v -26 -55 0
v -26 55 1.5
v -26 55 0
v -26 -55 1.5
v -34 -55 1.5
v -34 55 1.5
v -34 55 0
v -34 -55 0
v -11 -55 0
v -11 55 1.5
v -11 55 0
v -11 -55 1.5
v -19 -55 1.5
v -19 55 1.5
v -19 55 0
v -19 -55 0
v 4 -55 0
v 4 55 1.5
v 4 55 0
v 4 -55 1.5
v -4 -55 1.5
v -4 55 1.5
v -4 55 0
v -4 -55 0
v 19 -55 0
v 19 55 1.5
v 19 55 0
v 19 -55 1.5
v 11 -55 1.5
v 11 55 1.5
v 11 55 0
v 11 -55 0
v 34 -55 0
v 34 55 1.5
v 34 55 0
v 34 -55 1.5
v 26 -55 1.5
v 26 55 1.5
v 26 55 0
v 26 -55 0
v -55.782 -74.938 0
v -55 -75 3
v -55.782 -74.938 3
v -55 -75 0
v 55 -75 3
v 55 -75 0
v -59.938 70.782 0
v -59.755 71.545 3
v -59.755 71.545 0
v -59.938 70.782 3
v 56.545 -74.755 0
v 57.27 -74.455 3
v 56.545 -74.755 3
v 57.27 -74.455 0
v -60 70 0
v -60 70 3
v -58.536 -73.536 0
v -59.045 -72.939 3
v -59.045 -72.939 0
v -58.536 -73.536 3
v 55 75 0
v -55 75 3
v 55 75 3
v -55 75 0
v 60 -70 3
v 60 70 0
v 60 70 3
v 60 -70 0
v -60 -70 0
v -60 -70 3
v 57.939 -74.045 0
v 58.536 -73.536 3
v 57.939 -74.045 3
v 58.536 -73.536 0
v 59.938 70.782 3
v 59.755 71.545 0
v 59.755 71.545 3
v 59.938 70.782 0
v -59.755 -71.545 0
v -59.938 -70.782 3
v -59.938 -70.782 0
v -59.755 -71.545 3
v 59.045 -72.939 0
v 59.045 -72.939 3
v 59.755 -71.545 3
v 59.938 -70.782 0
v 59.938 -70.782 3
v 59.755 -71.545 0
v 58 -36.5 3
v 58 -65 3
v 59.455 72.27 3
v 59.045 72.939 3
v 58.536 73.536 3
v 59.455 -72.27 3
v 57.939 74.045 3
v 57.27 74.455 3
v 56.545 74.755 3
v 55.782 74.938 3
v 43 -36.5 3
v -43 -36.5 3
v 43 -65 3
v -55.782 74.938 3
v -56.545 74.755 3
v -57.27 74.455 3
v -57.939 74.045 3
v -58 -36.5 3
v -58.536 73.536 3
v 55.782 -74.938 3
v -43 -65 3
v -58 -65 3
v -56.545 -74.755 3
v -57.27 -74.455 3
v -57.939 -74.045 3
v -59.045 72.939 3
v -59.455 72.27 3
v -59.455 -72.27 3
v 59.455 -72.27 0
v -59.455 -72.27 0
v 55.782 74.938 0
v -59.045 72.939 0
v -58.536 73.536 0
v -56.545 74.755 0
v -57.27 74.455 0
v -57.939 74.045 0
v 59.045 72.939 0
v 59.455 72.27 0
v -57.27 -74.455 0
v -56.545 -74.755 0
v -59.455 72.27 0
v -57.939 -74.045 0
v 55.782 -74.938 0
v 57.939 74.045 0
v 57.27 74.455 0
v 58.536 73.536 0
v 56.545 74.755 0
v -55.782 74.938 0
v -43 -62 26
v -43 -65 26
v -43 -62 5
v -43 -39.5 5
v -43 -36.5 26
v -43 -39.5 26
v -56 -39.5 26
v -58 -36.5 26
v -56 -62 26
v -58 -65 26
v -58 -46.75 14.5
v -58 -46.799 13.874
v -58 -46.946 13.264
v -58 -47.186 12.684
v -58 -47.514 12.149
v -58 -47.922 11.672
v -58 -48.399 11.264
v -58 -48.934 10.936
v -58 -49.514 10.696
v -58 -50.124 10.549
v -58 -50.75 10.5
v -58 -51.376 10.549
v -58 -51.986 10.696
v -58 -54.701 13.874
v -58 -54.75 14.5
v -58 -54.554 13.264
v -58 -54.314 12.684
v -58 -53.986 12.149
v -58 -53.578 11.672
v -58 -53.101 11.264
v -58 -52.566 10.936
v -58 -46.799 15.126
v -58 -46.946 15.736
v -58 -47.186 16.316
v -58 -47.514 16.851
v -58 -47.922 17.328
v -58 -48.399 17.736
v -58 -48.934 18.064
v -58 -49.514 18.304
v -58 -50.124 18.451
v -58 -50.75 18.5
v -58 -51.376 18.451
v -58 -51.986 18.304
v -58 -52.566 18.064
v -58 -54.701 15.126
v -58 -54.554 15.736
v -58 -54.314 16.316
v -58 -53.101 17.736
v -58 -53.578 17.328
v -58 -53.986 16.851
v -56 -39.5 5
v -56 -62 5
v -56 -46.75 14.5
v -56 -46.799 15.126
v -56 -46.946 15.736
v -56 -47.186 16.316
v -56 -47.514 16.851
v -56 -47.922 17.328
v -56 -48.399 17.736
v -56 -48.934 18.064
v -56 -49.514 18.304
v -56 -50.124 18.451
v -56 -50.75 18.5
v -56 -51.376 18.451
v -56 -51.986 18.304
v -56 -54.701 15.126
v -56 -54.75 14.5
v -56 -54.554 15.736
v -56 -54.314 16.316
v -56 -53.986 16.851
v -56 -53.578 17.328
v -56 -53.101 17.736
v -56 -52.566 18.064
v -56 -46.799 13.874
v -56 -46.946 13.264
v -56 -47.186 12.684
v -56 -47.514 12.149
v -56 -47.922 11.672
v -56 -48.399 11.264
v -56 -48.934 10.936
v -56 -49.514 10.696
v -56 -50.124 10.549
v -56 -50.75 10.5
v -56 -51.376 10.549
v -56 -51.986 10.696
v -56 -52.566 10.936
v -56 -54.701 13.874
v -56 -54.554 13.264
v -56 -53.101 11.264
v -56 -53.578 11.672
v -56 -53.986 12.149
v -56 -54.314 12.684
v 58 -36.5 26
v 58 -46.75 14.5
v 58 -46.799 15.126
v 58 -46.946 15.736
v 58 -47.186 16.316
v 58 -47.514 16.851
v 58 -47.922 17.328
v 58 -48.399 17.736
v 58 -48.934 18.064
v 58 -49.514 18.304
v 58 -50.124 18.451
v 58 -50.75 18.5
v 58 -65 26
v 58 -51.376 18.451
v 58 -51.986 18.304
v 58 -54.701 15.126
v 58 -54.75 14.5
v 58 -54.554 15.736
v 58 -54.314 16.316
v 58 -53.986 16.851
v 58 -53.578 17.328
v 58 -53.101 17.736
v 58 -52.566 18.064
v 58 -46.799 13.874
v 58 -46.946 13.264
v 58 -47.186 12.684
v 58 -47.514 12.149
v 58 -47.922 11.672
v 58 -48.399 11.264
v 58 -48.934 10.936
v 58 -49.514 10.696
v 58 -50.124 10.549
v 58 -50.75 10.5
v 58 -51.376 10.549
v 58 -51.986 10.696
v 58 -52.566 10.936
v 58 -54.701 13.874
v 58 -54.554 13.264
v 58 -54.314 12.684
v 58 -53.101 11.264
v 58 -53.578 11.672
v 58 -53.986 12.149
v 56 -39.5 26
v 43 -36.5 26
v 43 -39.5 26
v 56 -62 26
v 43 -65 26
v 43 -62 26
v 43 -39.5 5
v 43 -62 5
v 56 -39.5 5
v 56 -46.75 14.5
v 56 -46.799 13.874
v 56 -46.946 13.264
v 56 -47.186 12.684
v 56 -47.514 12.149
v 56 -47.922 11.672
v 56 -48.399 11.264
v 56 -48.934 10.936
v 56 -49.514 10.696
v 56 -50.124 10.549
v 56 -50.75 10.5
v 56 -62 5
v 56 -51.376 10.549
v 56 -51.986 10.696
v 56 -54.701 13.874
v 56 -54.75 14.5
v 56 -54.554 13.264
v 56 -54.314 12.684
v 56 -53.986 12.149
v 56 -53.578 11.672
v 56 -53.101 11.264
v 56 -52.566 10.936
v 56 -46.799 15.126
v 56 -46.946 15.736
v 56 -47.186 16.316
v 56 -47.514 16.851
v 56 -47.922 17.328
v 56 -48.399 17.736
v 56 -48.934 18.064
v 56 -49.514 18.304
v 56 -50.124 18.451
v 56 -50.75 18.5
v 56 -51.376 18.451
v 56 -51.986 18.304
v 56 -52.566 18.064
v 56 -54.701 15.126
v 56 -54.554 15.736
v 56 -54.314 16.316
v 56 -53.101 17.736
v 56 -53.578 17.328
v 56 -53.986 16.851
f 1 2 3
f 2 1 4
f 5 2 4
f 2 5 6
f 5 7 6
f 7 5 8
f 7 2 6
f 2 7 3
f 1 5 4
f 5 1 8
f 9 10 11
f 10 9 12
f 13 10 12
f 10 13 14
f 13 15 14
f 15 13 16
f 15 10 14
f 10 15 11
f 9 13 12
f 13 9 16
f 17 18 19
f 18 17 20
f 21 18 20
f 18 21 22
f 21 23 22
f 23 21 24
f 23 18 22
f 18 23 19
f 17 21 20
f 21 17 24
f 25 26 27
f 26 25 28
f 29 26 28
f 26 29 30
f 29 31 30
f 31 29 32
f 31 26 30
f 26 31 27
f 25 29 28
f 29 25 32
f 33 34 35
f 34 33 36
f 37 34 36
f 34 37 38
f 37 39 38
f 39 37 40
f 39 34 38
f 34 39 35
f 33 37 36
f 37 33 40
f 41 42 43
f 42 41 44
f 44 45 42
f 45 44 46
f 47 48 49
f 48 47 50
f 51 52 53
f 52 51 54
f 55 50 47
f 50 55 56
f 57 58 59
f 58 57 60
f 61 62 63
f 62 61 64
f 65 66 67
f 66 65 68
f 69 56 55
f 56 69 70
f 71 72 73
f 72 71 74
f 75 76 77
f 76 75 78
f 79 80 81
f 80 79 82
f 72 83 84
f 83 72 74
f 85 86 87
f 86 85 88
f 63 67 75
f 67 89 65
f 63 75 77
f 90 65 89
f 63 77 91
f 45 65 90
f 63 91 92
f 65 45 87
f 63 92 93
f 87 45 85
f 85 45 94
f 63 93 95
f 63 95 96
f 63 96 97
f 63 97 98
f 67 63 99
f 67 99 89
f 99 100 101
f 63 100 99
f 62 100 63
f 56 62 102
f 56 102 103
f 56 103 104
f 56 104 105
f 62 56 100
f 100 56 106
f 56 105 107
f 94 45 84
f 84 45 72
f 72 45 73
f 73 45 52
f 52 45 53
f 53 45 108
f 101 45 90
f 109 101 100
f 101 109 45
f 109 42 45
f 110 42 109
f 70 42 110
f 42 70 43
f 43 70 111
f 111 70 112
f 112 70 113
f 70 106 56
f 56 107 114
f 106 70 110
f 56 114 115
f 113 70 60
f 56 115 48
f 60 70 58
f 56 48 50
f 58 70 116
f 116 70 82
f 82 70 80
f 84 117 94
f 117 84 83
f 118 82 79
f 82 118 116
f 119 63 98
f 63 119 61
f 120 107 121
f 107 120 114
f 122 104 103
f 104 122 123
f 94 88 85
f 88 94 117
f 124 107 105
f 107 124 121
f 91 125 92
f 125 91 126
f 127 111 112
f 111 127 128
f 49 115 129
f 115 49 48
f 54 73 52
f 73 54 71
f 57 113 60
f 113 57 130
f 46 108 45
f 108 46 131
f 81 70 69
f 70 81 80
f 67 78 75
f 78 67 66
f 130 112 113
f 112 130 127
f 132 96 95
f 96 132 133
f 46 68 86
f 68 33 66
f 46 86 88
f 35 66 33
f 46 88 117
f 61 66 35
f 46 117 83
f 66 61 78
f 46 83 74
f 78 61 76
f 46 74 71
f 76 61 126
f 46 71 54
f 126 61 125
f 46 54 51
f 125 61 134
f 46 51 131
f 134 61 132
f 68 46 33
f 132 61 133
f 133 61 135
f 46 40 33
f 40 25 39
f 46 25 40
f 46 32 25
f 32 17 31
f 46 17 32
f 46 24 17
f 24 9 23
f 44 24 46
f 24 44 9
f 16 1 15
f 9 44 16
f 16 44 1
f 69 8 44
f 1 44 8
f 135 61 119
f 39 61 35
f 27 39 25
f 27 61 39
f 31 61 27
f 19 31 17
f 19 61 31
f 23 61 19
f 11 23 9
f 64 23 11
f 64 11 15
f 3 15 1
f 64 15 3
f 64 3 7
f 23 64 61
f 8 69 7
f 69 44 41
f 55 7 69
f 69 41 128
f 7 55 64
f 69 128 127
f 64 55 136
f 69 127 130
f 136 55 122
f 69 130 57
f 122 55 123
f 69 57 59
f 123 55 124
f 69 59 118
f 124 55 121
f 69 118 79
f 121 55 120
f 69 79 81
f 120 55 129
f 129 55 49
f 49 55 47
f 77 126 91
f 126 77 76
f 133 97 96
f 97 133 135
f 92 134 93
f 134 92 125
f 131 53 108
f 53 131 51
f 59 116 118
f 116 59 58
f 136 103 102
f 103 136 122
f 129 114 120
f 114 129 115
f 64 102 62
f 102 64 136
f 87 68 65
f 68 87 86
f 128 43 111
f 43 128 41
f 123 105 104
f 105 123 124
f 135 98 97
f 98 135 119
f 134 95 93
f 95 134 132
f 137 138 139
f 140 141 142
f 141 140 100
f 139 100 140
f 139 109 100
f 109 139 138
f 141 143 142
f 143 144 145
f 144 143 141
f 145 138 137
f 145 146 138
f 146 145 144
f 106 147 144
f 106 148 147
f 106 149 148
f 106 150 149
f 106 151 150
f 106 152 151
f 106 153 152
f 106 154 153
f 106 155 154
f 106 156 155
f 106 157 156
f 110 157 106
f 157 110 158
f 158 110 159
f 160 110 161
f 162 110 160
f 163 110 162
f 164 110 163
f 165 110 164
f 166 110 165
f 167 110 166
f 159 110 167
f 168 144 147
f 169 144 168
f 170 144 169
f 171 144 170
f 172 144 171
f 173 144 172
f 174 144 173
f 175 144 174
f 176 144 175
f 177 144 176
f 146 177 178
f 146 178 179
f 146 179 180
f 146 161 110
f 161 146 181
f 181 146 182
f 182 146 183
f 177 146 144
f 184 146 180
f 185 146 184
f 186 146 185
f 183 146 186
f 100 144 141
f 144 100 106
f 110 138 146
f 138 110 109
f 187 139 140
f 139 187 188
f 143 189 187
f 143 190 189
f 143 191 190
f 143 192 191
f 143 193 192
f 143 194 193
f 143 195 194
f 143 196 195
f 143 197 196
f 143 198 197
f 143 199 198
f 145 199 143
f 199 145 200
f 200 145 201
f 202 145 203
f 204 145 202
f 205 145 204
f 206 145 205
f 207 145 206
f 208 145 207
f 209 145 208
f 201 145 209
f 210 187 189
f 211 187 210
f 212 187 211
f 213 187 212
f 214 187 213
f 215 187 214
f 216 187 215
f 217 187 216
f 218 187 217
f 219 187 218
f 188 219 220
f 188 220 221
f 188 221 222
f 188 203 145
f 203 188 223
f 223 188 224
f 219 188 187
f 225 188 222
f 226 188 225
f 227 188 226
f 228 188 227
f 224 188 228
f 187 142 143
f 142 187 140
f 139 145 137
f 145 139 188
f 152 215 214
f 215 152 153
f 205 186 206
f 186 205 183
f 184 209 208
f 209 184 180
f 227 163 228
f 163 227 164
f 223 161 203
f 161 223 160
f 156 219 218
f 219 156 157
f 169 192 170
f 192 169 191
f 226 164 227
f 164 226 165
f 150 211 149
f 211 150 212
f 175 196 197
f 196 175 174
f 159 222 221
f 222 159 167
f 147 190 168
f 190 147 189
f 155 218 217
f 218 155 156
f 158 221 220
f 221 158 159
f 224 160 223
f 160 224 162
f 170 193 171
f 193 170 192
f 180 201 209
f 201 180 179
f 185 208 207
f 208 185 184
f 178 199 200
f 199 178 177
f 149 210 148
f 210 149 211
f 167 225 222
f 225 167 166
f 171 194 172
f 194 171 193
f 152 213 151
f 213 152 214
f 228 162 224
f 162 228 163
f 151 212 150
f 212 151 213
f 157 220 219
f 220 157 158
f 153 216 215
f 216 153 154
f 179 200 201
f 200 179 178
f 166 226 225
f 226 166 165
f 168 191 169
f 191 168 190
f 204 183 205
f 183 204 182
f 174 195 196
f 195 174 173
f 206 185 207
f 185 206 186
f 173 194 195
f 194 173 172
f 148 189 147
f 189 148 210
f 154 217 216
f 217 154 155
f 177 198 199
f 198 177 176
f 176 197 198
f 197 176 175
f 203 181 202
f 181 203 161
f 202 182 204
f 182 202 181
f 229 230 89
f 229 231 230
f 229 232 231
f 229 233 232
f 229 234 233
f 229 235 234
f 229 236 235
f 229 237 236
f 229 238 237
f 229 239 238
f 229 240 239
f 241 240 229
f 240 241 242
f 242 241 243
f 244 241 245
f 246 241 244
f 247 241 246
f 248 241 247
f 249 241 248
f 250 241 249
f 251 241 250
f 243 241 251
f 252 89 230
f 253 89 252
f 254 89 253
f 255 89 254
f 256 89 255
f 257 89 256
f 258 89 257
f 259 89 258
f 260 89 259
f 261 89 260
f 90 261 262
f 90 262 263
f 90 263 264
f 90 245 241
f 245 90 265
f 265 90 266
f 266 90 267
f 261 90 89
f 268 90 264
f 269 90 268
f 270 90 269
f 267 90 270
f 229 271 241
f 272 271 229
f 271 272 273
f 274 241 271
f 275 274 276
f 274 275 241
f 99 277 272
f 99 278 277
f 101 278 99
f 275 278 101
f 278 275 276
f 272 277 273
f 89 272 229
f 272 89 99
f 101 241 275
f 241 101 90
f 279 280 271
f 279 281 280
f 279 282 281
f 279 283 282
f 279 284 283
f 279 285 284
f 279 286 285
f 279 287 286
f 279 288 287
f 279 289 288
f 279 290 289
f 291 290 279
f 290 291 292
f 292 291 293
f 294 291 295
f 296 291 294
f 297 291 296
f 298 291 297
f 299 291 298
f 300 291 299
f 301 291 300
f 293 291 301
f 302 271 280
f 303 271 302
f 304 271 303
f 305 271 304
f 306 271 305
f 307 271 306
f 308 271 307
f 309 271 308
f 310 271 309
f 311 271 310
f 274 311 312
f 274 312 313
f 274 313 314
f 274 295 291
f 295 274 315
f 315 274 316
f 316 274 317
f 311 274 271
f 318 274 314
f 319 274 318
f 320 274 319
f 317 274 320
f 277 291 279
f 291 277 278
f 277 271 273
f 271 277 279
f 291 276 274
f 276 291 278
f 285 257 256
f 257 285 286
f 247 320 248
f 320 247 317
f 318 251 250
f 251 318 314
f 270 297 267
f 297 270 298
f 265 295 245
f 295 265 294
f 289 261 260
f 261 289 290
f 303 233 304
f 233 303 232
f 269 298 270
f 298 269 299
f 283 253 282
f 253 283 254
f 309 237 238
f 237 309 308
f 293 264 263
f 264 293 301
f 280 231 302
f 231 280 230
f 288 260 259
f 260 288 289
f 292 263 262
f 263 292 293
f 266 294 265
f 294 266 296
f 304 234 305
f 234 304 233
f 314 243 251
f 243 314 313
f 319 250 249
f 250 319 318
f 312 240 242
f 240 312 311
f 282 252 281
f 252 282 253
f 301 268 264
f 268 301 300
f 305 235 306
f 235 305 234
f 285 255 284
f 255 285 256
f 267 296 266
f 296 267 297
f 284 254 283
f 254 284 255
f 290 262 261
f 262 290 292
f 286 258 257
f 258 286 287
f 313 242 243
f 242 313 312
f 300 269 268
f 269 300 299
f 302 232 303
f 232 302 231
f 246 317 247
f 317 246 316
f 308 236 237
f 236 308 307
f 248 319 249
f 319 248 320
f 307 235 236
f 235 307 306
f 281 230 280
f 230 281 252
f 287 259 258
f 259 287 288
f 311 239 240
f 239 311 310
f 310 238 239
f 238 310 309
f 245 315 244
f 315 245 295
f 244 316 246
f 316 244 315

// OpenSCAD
// Chasis Principal del Robot de Orugas (USS Thermal Rescue Bot)
// Taller de Programación I - Solemne 3

$fn = 40;

// Parámetros del Chasis
chasis_w = 120.0; // Ancho total
chasis_l = 150.0; // Largo total
chasis_t = 3.0;   // Grosor de la base
wall_h = 25.0;    // Altura de paredes laterales

// Parámetros de los Motores TT (DC amarillos)
motor_w = 22.5;   // Ancho del motor
motor_l = 70.0;   // Largo del motor
motor_h = 19.0;   // Altura del motor

module placa_base() {
    difference() {
        // Base plana con esquinas redondeadas
        hull() {
            translate([-chasis_w/2+5, -chasis_l/2+5, 0]) cylinder(r=5, h=chasis_t);
            translate([chasis_w/2-5, -chasis_l/2+5, 0]) cylinder(r=5, h=chasis_t);
            translate([-chasis_w/2+5, chasis_l/2-5, 0]) cylinder(r=5, h=chasis_t);
            translate([chasis_w/2-5, chasis_l/2-5, 0]) cylinder(r=5, h=chasis_t);
        }
        
        // Ranuras de ventilación y reducción de peso
        for (i = [-30:15:30]) {
            translate([i, 0, -1])
                cube([8, chasis_l - 40, chasis_t + 2], center=true);
        }
    }
}

module soportes_motores() {
    // Soportes traseros para motores DC TT
    translate([-chasis_w/2 + 2, -chasis_l/2 + 10, chasis_t]) {
        difference() {
            cube([15, motor_w + 6, motor_h + 4]);
            // Espacio interior del motor
            translate([2, 3, 2]) cube([14, motor_w, motor_h + 5]);
            // Eje de salida
            translate([-5, (motor_w+6)/2, motor_h/2 + 2]) rotate([0, 90, 0]) cylinder(r=4, h=25);
        }
    }
    
    translate([chasis_w/2 - 17, -chasis_l/2 + 10, chasis_t]) {
        difference() {
            cube([15, motor_w + 6, motor_h + 4]);
            // Espacio interior del motor
            translate([-1, 3, 2]) cube([14, motor_w, motor_h + 5]);
            // Eje de salida
            translate([-5, (motor_w+6)/2, motor_h/2 + 2]) rotate([0, 90, 0]) cylinder(r=4, h=25);
        }
    }
}

// Ensamblado
placa_base();
soportes_motores();
